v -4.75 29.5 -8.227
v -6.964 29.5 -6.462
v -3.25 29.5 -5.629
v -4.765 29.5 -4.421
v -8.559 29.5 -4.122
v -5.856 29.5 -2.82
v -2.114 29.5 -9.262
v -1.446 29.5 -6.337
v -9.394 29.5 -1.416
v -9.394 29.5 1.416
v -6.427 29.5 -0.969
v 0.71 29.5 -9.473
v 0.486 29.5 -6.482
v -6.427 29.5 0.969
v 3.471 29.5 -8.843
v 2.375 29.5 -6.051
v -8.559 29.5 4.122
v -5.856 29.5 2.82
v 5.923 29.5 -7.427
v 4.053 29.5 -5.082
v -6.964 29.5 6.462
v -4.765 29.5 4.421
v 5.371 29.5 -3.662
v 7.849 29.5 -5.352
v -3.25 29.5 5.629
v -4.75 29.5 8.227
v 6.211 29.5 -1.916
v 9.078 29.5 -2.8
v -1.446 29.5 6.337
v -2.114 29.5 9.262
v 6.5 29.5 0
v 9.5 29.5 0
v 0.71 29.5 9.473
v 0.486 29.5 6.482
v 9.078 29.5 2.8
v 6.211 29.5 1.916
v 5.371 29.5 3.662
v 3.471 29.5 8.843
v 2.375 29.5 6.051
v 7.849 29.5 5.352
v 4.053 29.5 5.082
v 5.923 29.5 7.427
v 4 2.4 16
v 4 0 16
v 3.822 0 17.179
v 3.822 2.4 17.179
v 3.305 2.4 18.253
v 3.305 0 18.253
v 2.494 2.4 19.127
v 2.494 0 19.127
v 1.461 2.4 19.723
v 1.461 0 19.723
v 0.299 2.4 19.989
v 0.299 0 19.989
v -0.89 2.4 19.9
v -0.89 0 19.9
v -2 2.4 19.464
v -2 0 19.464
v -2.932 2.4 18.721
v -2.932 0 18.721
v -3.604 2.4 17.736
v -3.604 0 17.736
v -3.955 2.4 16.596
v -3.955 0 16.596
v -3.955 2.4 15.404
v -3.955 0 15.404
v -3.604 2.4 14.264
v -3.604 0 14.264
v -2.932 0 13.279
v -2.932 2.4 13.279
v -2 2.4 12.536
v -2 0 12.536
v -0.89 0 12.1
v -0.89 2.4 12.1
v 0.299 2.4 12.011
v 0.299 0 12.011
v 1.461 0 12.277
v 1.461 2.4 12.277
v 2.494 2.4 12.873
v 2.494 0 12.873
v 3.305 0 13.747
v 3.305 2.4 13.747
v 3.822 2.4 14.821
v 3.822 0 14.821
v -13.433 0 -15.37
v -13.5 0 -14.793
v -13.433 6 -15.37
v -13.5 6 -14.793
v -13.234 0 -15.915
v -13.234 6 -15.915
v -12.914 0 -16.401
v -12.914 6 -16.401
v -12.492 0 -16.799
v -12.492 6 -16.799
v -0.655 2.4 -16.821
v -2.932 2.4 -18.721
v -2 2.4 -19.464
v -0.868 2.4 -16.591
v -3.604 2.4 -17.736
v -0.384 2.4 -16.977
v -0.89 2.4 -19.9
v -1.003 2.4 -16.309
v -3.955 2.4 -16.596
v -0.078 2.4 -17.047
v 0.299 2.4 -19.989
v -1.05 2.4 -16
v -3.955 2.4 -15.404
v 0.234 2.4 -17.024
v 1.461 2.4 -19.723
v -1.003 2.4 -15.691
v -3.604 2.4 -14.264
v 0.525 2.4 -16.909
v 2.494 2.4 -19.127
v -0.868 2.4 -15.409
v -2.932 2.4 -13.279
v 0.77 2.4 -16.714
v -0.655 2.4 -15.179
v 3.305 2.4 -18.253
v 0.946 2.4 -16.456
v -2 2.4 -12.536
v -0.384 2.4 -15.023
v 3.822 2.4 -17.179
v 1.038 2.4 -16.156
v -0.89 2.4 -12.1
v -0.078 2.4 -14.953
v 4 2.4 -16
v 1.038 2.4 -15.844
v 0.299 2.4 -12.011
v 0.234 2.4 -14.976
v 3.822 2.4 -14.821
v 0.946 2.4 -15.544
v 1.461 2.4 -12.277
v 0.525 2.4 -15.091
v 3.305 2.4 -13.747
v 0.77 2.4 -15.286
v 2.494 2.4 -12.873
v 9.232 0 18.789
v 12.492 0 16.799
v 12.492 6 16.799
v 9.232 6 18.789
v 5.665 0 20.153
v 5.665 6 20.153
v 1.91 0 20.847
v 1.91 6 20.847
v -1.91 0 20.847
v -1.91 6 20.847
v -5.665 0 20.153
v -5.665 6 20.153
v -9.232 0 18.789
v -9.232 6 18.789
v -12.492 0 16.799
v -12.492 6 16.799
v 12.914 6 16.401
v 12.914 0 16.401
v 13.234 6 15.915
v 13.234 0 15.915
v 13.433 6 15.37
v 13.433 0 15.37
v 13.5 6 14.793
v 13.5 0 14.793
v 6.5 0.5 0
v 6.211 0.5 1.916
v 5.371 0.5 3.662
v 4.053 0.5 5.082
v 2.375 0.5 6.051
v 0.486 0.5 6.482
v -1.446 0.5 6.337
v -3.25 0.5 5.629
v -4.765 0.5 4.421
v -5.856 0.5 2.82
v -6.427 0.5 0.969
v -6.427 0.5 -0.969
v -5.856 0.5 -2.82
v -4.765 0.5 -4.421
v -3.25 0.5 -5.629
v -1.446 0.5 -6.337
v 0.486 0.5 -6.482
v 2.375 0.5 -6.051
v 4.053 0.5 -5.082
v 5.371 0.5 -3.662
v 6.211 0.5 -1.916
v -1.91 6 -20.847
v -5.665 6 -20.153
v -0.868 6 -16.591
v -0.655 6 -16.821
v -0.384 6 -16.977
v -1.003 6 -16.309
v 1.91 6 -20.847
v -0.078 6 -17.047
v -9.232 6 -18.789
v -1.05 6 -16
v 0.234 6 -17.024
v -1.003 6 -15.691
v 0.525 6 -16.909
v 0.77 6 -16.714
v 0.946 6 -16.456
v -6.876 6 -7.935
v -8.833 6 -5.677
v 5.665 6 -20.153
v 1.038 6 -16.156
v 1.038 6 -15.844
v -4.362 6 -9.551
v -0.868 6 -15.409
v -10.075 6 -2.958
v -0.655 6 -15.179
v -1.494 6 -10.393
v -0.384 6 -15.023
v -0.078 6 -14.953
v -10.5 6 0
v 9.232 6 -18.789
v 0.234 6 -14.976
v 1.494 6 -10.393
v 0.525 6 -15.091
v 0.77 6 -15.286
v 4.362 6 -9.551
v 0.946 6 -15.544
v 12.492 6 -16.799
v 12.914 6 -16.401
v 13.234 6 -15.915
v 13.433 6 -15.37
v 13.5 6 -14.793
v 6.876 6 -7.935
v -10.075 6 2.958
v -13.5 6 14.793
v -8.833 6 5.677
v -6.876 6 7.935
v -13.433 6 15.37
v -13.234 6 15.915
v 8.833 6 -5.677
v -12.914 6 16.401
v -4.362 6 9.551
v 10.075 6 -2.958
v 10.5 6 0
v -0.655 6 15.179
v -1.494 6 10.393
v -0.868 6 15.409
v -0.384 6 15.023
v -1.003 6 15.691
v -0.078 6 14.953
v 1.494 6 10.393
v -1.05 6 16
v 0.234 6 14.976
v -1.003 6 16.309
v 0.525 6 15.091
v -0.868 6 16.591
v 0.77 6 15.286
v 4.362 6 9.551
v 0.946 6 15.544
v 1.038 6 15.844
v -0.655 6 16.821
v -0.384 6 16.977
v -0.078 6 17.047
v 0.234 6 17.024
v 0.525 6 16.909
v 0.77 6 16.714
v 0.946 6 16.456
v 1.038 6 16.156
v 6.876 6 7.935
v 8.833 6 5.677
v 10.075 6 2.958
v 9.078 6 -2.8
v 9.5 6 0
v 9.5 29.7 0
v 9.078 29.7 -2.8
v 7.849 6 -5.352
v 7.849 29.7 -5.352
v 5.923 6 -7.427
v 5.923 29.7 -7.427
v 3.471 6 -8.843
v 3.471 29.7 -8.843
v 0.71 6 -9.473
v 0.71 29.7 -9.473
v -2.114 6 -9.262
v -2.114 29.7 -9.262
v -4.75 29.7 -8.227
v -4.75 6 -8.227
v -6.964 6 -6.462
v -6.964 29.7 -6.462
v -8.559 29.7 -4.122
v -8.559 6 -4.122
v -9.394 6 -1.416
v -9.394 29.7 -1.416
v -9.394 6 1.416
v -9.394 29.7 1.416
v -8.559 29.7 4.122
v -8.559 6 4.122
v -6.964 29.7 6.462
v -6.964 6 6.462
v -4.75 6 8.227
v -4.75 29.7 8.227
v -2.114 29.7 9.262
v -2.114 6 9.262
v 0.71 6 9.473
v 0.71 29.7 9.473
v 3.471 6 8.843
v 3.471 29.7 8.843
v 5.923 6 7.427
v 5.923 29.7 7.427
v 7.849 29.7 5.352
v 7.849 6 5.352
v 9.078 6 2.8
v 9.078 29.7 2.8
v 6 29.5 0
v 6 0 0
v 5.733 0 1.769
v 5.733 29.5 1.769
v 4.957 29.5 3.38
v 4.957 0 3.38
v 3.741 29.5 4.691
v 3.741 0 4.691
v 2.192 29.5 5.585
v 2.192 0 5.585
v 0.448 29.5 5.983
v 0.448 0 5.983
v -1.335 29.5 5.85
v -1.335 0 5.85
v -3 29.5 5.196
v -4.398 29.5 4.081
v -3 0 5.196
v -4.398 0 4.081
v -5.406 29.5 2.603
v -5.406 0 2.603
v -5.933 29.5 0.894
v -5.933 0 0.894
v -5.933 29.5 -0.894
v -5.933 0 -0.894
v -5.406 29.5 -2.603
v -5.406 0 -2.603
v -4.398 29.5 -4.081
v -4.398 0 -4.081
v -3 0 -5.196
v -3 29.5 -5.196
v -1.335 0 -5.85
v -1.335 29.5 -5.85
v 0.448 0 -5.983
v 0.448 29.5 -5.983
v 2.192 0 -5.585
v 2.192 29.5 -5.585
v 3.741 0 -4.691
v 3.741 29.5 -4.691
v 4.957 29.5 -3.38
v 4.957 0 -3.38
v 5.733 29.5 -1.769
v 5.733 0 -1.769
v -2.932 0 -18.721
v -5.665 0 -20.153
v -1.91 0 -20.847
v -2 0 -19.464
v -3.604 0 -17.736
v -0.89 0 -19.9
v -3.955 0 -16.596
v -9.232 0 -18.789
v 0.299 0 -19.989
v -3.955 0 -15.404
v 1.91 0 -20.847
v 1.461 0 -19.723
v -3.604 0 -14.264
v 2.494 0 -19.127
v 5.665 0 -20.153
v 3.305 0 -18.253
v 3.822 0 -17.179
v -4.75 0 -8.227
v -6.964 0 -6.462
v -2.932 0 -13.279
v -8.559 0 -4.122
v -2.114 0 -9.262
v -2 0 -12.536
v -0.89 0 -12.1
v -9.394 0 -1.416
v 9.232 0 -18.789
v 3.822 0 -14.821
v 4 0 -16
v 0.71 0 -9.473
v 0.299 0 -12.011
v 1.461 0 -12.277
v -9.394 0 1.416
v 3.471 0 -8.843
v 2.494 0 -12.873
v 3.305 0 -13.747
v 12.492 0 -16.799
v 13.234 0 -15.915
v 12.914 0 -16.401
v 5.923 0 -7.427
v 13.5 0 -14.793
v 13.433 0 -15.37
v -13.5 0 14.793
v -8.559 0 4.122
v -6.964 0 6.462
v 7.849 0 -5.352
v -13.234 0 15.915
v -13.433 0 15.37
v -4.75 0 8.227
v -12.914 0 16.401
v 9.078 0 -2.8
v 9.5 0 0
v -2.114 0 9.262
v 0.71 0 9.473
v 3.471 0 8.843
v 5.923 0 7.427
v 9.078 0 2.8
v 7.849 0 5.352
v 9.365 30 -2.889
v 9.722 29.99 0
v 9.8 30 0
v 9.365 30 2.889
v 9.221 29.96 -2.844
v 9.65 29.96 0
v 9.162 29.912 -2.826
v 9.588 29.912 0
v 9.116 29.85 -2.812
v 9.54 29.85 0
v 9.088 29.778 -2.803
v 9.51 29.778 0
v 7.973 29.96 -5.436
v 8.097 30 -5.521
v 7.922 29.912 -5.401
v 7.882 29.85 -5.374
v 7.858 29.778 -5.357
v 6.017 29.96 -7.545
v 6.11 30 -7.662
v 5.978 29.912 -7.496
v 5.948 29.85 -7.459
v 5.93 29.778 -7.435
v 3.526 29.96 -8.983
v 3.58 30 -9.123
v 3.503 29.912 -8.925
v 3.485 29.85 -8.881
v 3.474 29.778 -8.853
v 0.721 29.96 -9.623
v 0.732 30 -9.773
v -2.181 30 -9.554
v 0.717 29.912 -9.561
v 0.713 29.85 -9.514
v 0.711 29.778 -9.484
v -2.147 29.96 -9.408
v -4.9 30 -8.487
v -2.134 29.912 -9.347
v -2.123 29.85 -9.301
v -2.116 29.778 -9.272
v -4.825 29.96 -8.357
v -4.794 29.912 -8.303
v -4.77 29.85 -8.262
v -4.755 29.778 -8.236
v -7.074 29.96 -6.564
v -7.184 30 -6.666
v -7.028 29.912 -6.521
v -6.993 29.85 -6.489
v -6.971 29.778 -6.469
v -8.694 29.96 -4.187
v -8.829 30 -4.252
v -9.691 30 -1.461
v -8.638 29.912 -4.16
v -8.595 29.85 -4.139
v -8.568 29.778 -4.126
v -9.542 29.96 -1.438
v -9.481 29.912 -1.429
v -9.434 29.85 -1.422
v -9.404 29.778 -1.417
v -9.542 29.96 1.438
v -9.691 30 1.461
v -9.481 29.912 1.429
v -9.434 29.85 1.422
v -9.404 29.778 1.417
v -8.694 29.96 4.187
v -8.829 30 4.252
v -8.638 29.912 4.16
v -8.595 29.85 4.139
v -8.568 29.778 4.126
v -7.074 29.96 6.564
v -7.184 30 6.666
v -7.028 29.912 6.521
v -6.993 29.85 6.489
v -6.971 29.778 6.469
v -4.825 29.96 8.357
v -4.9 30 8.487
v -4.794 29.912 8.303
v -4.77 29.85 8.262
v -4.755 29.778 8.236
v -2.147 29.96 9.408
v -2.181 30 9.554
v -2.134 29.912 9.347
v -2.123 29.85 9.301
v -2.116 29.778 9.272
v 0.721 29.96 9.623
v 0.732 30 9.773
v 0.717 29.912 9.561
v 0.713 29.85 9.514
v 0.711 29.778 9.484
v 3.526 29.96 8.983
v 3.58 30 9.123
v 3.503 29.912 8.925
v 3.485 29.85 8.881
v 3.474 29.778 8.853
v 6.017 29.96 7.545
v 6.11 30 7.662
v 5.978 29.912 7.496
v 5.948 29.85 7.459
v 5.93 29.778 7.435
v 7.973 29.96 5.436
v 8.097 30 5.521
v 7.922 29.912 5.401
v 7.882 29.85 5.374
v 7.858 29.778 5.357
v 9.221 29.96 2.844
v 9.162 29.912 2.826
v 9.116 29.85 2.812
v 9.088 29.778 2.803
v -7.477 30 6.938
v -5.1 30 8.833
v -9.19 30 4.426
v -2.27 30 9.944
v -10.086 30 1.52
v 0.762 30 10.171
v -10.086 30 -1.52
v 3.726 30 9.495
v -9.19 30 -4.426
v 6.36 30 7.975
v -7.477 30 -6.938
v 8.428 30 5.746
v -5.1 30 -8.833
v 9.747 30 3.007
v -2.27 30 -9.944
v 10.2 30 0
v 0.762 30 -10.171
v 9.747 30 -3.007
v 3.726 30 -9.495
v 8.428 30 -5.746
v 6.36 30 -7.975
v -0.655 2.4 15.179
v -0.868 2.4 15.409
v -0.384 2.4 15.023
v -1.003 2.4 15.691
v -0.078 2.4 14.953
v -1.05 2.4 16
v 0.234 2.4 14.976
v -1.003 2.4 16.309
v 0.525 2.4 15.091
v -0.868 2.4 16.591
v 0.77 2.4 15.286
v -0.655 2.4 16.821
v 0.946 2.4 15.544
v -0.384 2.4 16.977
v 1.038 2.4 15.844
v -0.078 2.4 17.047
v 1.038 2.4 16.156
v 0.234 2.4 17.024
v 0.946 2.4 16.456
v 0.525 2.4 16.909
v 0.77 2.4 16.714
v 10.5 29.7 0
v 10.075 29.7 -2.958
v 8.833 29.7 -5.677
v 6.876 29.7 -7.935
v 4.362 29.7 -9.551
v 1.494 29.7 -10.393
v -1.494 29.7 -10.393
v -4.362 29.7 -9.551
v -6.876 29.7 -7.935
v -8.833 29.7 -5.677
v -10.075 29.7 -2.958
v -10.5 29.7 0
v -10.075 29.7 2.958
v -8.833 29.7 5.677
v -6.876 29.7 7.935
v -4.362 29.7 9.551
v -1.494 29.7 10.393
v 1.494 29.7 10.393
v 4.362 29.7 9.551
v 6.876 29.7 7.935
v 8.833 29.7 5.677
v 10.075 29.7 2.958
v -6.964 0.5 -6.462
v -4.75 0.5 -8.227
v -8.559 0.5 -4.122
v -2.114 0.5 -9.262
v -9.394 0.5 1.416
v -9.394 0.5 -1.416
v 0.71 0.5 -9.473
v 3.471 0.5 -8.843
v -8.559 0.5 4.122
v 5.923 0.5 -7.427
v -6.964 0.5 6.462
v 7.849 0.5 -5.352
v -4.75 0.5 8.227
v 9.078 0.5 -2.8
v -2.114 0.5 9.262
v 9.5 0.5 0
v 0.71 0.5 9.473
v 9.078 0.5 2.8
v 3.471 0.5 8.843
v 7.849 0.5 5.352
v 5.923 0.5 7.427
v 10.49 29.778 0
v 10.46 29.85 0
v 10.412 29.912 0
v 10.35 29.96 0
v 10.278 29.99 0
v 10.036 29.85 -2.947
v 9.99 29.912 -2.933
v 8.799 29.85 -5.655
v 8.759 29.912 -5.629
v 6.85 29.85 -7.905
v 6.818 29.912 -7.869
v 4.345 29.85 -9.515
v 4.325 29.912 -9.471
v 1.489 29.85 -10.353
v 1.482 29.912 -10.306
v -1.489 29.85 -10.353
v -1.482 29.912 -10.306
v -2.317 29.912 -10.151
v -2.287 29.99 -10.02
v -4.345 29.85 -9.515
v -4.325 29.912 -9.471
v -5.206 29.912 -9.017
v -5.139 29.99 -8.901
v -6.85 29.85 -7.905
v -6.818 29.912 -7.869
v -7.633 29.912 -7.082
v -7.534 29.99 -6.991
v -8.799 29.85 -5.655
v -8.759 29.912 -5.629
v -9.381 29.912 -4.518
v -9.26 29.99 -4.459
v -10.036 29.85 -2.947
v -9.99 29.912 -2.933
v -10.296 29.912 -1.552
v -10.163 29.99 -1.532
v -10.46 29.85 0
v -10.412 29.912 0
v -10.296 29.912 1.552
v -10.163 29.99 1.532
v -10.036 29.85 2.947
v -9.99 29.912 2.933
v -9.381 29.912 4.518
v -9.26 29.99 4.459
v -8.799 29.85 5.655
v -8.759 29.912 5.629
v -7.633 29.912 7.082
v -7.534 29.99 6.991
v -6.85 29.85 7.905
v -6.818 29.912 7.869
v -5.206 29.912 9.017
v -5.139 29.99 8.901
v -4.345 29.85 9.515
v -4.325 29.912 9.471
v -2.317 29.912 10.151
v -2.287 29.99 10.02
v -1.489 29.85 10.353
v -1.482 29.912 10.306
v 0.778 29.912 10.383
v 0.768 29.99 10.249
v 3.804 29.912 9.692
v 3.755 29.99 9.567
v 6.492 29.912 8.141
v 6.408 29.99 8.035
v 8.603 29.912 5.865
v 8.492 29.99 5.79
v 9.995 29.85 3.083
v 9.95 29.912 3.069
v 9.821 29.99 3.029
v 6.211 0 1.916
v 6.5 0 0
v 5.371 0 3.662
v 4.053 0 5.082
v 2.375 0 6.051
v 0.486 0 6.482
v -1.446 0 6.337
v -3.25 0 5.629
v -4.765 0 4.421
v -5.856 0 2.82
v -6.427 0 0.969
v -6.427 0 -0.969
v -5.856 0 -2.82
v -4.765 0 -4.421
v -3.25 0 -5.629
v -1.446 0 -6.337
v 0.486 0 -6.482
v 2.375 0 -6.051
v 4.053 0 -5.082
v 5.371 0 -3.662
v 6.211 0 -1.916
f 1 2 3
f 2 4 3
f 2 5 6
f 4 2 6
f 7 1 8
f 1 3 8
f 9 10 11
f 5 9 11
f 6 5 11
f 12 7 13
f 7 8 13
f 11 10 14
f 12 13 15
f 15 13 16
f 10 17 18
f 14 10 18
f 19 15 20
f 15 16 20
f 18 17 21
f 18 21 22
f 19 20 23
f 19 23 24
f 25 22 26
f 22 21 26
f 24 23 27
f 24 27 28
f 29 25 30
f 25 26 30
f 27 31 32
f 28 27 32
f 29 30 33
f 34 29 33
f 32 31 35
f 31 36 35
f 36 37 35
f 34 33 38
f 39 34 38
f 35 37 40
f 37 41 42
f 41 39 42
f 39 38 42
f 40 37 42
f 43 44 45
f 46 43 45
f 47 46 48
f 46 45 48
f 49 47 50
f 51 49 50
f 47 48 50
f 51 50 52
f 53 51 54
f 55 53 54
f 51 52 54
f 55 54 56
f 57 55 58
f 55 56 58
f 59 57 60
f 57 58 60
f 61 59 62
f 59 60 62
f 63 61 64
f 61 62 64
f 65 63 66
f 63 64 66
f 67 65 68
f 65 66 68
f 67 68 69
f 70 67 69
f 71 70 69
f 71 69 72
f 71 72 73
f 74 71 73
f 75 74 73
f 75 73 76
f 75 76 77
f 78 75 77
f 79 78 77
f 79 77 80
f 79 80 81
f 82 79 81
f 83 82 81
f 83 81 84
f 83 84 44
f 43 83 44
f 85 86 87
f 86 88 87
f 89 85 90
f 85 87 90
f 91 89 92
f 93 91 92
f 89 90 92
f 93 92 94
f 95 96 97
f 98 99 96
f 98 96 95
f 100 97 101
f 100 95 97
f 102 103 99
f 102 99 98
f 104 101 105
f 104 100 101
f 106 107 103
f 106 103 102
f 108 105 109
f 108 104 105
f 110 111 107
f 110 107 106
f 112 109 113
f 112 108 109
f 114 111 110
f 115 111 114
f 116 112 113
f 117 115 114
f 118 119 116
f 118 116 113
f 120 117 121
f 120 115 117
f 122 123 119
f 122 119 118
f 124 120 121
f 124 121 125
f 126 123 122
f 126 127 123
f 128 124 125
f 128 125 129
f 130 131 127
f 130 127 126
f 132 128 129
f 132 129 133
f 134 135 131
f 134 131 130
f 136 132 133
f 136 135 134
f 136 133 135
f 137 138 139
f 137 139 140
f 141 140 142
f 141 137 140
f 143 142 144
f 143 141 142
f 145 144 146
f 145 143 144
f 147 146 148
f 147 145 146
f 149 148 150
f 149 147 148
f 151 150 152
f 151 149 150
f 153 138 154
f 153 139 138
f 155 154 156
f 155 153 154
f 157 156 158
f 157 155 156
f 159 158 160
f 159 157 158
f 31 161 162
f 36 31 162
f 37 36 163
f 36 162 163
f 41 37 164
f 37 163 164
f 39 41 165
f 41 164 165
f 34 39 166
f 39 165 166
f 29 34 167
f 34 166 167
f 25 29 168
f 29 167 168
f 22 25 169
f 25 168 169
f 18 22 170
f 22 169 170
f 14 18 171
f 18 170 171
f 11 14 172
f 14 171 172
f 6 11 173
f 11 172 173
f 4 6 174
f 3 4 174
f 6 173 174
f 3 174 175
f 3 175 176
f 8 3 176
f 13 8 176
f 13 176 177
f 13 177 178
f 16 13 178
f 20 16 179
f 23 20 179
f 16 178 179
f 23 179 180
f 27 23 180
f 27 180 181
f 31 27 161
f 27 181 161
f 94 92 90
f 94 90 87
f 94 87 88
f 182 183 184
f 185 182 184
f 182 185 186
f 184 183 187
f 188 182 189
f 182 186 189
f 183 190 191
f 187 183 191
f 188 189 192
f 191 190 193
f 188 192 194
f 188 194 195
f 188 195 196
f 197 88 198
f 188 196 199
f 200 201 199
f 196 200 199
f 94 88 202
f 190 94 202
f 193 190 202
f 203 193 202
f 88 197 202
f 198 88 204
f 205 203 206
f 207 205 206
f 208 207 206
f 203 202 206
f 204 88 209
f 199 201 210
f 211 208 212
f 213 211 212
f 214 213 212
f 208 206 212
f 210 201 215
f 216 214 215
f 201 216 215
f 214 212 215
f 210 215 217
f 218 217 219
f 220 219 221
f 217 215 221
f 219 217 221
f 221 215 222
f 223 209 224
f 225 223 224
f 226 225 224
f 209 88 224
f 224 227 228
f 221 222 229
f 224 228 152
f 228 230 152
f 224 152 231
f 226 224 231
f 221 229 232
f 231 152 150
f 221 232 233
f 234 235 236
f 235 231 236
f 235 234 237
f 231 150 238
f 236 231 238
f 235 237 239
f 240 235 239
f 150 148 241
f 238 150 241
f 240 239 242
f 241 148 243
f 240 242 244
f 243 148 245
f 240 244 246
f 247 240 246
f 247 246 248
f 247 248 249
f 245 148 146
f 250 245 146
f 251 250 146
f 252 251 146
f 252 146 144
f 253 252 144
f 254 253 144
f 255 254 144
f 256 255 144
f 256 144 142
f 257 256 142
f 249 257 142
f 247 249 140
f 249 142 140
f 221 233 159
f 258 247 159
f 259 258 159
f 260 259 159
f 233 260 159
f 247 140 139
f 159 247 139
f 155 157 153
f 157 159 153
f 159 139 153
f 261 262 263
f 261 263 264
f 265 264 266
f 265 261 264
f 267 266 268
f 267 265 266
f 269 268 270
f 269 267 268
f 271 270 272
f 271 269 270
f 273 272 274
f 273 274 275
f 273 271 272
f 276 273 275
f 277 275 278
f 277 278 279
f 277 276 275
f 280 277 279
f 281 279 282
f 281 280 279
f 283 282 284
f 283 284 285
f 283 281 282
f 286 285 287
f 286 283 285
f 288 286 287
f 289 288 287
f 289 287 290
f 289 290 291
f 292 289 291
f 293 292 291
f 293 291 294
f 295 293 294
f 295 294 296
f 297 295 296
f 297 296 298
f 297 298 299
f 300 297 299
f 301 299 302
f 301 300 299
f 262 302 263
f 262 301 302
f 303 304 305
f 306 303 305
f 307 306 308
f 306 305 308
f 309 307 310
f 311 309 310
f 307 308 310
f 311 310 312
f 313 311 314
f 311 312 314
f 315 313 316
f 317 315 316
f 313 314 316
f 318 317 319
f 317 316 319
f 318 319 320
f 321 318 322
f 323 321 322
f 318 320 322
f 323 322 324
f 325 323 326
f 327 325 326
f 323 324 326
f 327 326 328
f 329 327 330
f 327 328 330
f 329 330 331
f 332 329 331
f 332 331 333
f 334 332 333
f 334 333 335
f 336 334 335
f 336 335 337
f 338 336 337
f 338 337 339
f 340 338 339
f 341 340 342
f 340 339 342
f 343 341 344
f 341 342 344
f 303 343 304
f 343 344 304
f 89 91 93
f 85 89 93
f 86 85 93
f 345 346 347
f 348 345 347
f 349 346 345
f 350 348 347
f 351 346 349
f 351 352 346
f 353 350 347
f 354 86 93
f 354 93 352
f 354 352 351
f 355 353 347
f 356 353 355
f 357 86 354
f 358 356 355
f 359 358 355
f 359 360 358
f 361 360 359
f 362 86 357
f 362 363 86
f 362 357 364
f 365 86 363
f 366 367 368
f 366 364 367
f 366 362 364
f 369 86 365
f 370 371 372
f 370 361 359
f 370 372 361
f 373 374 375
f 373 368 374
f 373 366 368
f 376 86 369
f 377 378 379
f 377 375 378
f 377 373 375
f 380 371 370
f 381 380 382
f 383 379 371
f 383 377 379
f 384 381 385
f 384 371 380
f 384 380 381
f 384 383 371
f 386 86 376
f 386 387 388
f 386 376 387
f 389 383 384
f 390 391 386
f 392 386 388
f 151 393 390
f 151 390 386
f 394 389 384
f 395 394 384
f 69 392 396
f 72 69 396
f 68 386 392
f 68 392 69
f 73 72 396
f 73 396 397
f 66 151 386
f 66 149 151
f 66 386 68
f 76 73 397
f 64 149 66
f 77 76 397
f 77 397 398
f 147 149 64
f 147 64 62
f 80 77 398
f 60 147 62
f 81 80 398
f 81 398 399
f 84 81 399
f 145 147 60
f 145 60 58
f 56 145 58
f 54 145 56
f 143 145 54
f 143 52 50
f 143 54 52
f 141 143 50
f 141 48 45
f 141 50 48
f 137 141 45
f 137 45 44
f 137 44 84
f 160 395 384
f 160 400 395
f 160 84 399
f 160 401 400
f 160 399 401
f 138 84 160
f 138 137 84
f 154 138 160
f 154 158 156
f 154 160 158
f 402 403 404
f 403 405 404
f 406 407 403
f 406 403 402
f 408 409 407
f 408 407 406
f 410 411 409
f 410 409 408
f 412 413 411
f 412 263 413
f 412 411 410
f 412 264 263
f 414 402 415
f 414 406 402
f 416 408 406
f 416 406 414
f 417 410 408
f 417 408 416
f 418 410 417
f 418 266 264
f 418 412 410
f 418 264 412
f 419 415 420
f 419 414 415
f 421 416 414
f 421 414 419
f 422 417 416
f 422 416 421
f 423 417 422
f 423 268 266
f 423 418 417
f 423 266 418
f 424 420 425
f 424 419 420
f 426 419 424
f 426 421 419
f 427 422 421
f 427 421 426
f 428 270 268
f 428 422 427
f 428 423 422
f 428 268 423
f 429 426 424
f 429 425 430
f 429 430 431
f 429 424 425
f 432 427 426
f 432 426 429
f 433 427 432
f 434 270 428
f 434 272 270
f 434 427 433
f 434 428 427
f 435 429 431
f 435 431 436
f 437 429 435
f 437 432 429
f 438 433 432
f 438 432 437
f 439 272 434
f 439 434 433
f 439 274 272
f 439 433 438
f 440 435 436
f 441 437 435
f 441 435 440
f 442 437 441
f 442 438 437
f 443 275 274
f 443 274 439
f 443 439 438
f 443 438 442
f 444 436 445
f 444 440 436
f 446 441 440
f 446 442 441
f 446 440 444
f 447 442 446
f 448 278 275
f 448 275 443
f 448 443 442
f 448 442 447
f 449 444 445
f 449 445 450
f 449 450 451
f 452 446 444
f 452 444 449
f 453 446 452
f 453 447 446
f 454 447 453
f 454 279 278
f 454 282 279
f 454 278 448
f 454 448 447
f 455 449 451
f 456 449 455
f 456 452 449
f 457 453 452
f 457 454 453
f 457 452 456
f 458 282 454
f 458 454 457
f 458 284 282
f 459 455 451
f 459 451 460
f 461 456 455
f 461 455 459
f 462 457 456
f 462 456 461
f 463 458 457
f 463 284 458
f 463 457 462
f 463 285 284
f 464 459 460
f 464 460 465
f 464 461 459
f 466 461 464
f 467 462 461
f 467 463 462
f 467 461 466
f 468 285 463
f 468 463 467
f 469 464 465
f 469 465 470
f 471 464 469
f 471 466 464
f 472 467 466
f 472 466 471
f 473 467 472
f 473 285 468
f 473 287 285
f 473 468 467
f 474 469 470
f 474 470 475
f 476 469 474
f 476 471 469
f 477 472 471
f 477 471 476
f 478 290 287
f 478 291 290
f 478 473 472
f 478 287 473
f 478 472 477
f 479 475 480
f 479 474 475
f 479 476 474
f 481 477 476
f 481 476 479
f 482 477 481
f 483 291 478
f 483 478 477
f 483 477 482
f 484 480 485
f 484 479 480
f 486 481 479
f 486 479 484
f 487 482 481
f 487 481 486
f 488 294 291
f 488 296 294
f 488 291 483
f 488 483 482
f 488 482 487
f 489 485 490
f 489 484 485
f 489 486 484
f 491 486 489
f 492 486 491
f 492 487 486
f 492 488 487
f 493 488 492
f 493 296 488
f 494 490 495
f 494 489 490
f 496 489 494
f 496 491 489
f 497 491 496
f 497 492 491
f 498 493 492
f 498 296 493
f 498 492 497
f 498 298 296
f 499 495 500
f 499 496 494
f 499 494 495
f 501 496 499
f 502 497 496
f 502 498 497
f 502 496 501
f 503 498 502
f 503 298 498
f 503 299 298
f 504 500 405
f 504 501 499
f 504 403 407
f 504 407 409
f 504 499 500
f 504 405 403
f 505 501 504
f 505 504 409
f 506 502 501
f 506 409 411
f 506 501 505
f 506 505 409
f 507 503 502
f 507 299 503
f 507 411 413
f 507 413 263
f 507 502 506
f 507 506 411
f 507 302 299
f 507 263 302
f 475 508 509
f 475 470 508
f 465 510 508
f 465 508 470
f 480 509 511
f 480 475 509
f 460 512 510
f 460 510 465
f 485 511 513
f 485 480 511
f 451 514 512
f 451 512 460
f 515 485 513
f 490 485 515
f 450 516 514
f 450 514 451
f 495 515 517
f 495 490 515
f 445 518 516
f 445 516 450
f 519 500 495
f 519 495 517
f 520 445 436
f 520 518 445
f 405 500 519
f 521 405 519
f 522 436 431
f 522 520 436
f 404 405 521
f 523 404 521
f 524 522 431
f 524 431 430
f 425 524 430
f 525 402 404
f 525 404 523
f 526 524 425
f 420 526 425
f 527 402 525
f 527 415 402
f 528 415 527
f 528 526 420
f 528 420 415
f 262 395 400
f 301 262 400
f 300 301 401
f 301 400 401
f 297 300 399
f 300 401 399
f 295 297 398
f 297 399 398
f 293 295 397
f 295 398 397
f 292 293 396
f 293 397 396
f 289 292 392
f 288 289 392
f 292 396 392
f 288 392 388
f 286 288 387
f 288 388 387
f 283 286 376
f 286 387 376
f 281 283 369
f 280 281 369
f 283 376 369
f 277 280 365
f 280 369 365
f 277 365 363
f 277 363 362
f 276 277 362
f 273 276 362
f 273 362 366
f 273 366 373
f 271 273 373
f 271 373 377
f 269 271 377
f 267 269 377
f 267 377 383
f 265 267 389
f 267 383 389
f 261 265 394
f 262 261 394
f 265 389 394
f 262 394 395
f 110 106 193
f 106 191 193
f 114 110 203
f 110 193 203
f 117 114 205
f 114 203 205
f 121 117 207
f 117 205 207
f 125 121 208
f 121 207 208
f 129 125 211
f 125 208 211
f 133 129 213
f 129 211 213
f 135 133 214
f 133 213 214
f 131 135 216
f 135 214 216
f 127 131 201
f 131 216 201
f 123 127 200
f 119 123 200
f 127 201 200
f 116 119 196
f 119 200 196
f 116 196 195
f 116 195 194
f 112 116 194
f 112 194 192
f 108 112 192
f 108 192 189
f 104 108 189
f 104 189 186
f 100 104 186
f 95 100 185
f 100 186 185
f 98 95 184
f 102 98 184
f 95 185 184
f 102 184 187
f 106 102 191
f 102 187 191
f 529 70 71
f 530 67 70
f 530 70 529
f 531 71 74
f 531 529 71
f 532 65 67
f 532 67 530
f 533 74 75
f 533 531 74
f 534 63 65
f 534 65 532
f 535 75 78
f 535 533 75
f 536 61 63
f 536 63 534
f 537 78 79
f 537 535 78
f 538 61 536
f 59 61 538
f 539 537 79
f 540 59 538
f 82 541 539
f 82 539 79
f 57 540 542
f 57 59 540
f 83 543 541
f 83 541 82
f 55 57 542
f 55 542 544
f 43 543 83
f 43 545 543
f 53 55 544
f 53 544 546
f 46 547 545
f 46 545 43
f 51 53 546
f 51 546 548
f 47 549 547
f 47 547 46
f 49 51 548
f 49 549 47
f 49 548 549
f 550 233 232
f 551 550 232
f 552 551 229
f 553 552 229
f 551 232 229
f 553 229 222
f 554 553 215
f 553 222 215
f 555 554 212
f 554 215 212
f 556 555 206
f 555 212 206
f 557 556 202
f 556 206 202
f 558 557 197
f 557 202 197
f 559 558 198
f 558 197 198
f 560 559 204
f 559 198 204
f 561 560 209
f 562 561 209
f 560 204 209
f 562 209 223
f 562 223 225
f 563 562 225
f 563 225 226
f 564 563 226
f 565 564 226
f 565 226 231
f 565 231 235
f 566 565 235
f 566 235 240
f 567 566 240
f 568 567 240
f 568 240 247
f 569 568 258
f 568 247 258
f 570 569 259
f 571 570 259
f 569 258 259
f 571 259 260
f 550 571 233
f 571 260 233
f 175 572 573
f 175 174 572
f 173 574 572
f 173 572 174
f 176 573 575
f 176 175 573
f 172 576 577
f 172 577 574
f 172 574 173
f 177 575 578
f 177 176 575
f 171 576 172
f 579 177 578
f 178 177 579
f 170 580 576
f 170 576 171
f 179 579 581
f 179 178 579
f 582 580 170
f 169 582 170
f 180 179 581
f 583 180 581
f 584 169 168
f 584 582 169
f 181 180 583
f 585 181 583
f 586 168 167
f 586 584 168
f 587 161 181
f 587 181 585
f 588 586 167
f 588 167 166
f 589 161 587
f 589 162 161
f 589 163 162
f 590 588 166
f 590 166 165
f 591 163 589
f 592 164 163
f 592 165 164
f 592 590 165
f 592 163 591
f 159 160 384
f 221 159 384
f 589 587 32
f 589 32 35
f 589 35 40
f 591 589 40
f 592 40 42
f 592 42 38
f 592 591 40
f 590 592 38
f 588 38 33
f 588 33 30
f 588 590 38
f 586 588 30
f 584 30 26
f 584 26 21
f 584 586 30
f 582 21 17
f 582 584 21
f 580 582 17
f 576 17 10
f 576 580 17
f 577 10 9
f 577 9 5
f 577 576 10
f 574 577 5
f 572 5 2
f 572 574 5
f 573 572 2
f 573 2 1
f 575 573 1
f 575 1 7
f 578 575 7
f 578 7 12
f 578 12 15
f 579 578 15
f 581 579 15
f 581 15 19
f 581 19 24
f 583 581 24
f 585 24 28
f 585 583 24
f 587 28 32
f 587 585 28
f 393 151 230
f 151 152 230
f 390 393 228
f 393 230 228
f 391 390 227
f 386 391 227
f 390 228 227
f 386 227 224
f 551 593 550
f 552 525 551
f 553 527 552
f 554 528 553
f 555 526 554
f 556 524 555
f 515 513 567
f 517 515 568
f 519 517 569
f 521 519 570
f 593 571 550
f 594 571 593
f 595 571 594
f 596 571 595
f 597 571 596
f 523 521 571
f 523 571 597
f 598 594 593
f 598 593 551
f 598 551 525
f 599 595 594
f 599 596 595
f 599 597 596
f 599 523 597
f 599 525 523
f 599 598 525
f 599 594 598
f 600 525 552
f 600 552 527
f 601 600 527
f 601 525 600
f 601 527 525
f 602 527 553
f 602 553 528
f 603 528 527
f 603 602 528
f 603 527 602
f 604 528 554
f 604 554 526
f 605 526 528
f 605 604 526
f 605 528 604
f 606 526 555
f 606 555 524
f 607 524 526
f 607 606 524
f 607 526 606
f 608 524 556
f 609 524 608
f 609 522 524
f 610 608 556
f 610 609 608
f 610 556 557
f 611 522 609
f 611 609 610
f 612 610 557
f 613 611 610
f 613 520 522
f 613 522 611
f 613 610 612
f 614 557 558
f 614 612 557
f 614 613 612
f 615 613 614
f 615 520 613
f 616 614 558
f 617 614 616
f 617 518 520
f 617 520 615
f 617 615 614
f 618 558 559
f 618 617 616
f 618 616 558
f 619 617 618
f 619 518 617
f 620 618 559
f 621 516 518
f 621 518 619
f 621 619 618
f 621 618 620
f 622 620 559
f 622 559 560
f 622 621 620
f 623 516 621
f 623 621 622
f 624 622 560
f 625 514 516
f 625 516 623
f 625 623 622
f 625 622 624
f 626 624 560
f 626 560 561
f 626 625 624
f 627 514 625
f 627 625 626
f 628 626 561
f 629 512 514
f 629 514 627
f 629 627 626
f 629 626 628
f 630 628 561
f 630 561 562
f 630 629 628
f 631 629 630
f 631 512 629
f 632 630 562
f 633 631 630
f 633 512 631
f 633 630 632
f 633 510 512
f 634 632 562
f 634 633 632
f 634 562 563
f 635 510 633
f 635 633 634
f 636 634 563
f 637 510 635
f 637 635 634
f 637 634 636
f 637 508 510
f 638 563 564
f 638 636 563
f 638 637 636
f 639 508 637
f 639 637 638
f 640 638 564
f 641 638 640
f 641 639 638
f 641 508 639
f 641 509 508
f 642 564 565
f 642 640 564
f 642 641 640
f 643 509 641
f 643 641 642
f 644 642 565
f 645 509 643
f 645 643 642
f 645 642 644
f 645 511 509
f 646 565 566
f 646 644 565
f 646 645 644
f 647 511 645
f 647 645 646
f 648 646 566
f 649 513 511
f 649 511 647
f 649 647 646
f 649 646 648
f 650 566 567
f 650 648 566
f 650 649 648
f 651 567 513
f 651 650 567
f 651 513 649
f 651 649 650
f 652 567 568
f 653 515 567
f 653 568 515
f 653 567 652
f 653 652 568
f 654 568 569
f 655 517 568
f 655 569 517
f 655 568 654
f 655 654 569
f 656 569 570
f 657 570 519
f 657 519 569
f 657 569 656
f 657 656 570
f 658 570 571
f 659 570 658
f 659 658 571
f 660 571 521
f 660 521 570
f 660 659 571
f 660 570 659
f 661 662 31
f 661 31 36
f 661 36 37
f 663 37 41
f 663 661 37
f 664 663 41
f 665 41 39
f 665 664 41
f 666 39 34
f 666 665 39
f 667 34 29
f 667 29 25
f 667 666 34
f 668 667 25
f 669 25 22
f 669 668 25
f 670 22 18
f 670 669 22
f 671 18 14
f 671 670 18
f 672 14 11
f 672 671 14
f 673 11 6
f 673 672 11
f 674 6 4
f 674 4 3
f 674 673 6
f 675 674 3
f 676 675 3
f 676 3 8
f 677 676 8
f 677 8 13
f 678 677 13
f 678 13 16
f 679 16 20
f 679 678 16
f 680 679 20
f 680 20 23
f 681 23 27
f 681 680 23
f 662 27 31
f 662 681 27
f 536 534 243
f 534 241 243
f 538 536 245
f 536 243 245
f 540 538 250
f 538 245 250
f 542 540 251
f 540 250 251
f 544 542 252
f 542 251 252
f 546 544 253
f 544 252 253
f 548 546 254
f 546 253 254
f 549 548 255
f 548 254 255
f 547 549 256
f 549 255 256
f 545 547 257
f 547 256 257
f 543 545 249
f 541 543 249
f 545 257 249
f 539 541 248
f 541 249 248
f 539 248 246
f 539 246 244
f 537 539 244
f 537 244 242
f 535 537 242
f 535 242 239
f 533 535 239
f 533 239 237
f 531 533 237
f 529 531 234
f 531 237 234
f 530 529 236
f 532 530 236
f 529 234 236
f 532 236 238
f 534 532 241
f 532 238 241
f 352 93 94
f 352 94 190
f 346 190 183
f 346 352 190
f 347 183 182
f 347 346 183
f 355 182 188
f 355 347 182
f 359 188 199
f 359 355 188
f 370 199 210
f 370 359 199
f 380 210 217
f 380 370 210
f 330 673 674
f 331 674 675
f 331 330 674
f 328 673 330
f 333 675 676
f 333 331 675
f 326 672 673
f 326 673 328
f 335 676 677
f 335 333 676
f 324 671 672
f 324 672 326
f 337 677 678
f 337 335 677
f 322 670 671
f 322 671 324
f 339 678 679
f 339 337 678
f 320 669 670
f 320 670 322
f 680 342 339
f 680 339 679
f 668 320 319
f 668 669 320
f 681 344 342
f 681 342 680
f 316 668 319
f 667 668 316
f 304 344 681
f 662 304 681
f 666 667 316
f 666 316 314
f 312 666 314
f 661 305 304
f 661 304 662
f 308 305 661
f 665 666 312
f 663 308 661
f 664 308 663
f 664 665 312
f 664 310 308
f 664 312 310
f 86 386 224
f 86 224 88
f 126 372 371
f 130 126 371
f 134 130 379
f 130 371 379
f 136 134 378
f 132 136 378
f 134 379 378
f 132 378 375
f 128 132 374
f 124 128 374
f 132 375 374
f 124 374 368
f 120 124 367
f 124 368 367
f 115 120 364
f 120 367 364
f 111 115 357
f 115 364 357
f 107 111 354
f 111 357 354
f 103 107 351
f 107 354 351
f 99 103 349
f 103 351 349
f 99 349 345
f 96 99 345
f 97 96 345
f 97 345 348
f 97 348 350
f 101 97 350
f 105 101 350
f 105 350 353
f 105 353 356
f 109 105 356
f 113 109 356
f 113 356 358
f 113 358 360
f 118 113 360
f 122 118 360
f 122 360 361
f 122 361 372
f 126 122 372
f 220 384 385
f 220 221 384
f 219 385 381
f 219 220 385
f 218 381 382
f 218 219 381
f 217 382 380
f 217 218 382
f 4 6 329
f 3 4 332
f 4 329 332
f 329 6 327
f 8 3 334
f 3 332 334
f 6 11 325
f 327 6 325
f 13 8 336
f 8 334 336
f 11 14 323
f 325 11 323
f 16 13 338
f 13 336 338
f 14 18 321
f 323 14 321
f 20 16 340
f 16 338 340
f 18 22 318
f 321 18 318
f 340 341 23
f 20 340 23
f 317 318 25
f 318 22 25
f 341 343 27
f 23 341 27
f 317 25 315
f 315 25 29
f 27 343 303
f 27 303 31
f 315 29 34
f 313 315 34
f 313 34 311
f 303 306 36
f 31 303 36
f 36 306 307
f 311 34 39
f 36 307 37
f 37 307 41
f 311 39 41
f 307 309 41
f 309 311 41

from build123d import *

# Parameters (mm, degrees)
SKETCH_R         = 9.5
PAD_DEPTH        = 6
HOLE_D           = 2.1
HOLE_CBORE_D     = 8
HOLE_CBORE_DEPTH = 2.4
SKETCH002_R      = 10.5
SKETCH002_R_2    = 9.5
PAD001_DEPTH     = 24
FILLET_R         = 2.5
FILLET001_R      = 0.3
SKETCH003_R      = 9.5
SKETCH003_R_2    = 6.5
PAD002_DEPTH     = 29
SKETCH004_R      = 6.5
SKETCH004_R_2    = 6
PAD003_DEPTH     = 29.5


with BuildPart() as body:
    # Sketch → Pad (new body)
    with BuildSketch(Plane.XZ):
        with BuildLine():
            ThreePointArc((13.5, 16), (0, 20.934421), (-13.5, 16))
            Line((-13.5, 16), (-13.5, -16))
            ThreePointArc((-13.5, -16), (0, -20.934421), (13.5, -16))
            Line((13.5, 16), (13.5, -16))
        make_face()
        Circle(SKETCH_R, mode=Mode.SUBTRACT)
    extrude(amount=-PAD_DEPTH)

    # Hole (through all)
    with Locations(Plane.XZ):
        with Locations((0, 16), (0, -16)):
            CounterBoreHole(HOLE_D / 2, HOLE_CBORE_D / 2, HOLE_CBORE_DEPTH)

    # Sketch002 (on Face5 of Hole) → Pad001 (join)
    with BuildSketch(Plane(origin=(0, 6, 0), x_dir=(1, 0, 0), z_dir=(0, 1, 0))):
        Circle(SKETCH002_R)
        Circle(SKETCH002_R_2, mode=Mode.SUBTRACT)
    extrude(amount=PAD001_DEPTH)

    # Fillet
    fillet_edges = [body.edges().sort_by_distance(p)[0] for p in [
        (13.5, 3, -16),
        (13.5, 3, 16),
        (-13.5, 3, 16),
        (-13.5, 3, -16),
    ]]
    fillet(fillet_edges, radius=FILLET_R)

    # Fillet001
    fillet001_edges = [body.edges().sort_by_distance(p)[0] for p in [
        (-10.5, 30, 0),
        (-9.5, 30, 0),
    ]]
    fillet(fillet001_edges, radius=FILLET001_R)


with BuildPart() as body001:
    # Sketch003 → Pad002 (new body)
    with BuildSketch(Plane.XZ):
        Circle(SKETCH003_R)
        Circle(SKETCH003_R_2, mode=Mode.SUBTRACT)
    extrude(amount=-PAD002_DEPTH)


with BuildPart() as body001_1:
    # Body001 placement: moved
    add(body001.part.moved(Location((0, 0.5, 0))))


with BuildPart() as body002:
    # Sketch004 → Pad003 (new body)
    with BuildSketch(Plane.XZ):
        Circle(SKETCH004_R)
        Circle(SKETCH004_R_2, mode=Mode.SUBTRACT)
    extrude(amount=-PAD003_DEPTH)


solid = Compound([body.part, body001_1.part, body002.part])
